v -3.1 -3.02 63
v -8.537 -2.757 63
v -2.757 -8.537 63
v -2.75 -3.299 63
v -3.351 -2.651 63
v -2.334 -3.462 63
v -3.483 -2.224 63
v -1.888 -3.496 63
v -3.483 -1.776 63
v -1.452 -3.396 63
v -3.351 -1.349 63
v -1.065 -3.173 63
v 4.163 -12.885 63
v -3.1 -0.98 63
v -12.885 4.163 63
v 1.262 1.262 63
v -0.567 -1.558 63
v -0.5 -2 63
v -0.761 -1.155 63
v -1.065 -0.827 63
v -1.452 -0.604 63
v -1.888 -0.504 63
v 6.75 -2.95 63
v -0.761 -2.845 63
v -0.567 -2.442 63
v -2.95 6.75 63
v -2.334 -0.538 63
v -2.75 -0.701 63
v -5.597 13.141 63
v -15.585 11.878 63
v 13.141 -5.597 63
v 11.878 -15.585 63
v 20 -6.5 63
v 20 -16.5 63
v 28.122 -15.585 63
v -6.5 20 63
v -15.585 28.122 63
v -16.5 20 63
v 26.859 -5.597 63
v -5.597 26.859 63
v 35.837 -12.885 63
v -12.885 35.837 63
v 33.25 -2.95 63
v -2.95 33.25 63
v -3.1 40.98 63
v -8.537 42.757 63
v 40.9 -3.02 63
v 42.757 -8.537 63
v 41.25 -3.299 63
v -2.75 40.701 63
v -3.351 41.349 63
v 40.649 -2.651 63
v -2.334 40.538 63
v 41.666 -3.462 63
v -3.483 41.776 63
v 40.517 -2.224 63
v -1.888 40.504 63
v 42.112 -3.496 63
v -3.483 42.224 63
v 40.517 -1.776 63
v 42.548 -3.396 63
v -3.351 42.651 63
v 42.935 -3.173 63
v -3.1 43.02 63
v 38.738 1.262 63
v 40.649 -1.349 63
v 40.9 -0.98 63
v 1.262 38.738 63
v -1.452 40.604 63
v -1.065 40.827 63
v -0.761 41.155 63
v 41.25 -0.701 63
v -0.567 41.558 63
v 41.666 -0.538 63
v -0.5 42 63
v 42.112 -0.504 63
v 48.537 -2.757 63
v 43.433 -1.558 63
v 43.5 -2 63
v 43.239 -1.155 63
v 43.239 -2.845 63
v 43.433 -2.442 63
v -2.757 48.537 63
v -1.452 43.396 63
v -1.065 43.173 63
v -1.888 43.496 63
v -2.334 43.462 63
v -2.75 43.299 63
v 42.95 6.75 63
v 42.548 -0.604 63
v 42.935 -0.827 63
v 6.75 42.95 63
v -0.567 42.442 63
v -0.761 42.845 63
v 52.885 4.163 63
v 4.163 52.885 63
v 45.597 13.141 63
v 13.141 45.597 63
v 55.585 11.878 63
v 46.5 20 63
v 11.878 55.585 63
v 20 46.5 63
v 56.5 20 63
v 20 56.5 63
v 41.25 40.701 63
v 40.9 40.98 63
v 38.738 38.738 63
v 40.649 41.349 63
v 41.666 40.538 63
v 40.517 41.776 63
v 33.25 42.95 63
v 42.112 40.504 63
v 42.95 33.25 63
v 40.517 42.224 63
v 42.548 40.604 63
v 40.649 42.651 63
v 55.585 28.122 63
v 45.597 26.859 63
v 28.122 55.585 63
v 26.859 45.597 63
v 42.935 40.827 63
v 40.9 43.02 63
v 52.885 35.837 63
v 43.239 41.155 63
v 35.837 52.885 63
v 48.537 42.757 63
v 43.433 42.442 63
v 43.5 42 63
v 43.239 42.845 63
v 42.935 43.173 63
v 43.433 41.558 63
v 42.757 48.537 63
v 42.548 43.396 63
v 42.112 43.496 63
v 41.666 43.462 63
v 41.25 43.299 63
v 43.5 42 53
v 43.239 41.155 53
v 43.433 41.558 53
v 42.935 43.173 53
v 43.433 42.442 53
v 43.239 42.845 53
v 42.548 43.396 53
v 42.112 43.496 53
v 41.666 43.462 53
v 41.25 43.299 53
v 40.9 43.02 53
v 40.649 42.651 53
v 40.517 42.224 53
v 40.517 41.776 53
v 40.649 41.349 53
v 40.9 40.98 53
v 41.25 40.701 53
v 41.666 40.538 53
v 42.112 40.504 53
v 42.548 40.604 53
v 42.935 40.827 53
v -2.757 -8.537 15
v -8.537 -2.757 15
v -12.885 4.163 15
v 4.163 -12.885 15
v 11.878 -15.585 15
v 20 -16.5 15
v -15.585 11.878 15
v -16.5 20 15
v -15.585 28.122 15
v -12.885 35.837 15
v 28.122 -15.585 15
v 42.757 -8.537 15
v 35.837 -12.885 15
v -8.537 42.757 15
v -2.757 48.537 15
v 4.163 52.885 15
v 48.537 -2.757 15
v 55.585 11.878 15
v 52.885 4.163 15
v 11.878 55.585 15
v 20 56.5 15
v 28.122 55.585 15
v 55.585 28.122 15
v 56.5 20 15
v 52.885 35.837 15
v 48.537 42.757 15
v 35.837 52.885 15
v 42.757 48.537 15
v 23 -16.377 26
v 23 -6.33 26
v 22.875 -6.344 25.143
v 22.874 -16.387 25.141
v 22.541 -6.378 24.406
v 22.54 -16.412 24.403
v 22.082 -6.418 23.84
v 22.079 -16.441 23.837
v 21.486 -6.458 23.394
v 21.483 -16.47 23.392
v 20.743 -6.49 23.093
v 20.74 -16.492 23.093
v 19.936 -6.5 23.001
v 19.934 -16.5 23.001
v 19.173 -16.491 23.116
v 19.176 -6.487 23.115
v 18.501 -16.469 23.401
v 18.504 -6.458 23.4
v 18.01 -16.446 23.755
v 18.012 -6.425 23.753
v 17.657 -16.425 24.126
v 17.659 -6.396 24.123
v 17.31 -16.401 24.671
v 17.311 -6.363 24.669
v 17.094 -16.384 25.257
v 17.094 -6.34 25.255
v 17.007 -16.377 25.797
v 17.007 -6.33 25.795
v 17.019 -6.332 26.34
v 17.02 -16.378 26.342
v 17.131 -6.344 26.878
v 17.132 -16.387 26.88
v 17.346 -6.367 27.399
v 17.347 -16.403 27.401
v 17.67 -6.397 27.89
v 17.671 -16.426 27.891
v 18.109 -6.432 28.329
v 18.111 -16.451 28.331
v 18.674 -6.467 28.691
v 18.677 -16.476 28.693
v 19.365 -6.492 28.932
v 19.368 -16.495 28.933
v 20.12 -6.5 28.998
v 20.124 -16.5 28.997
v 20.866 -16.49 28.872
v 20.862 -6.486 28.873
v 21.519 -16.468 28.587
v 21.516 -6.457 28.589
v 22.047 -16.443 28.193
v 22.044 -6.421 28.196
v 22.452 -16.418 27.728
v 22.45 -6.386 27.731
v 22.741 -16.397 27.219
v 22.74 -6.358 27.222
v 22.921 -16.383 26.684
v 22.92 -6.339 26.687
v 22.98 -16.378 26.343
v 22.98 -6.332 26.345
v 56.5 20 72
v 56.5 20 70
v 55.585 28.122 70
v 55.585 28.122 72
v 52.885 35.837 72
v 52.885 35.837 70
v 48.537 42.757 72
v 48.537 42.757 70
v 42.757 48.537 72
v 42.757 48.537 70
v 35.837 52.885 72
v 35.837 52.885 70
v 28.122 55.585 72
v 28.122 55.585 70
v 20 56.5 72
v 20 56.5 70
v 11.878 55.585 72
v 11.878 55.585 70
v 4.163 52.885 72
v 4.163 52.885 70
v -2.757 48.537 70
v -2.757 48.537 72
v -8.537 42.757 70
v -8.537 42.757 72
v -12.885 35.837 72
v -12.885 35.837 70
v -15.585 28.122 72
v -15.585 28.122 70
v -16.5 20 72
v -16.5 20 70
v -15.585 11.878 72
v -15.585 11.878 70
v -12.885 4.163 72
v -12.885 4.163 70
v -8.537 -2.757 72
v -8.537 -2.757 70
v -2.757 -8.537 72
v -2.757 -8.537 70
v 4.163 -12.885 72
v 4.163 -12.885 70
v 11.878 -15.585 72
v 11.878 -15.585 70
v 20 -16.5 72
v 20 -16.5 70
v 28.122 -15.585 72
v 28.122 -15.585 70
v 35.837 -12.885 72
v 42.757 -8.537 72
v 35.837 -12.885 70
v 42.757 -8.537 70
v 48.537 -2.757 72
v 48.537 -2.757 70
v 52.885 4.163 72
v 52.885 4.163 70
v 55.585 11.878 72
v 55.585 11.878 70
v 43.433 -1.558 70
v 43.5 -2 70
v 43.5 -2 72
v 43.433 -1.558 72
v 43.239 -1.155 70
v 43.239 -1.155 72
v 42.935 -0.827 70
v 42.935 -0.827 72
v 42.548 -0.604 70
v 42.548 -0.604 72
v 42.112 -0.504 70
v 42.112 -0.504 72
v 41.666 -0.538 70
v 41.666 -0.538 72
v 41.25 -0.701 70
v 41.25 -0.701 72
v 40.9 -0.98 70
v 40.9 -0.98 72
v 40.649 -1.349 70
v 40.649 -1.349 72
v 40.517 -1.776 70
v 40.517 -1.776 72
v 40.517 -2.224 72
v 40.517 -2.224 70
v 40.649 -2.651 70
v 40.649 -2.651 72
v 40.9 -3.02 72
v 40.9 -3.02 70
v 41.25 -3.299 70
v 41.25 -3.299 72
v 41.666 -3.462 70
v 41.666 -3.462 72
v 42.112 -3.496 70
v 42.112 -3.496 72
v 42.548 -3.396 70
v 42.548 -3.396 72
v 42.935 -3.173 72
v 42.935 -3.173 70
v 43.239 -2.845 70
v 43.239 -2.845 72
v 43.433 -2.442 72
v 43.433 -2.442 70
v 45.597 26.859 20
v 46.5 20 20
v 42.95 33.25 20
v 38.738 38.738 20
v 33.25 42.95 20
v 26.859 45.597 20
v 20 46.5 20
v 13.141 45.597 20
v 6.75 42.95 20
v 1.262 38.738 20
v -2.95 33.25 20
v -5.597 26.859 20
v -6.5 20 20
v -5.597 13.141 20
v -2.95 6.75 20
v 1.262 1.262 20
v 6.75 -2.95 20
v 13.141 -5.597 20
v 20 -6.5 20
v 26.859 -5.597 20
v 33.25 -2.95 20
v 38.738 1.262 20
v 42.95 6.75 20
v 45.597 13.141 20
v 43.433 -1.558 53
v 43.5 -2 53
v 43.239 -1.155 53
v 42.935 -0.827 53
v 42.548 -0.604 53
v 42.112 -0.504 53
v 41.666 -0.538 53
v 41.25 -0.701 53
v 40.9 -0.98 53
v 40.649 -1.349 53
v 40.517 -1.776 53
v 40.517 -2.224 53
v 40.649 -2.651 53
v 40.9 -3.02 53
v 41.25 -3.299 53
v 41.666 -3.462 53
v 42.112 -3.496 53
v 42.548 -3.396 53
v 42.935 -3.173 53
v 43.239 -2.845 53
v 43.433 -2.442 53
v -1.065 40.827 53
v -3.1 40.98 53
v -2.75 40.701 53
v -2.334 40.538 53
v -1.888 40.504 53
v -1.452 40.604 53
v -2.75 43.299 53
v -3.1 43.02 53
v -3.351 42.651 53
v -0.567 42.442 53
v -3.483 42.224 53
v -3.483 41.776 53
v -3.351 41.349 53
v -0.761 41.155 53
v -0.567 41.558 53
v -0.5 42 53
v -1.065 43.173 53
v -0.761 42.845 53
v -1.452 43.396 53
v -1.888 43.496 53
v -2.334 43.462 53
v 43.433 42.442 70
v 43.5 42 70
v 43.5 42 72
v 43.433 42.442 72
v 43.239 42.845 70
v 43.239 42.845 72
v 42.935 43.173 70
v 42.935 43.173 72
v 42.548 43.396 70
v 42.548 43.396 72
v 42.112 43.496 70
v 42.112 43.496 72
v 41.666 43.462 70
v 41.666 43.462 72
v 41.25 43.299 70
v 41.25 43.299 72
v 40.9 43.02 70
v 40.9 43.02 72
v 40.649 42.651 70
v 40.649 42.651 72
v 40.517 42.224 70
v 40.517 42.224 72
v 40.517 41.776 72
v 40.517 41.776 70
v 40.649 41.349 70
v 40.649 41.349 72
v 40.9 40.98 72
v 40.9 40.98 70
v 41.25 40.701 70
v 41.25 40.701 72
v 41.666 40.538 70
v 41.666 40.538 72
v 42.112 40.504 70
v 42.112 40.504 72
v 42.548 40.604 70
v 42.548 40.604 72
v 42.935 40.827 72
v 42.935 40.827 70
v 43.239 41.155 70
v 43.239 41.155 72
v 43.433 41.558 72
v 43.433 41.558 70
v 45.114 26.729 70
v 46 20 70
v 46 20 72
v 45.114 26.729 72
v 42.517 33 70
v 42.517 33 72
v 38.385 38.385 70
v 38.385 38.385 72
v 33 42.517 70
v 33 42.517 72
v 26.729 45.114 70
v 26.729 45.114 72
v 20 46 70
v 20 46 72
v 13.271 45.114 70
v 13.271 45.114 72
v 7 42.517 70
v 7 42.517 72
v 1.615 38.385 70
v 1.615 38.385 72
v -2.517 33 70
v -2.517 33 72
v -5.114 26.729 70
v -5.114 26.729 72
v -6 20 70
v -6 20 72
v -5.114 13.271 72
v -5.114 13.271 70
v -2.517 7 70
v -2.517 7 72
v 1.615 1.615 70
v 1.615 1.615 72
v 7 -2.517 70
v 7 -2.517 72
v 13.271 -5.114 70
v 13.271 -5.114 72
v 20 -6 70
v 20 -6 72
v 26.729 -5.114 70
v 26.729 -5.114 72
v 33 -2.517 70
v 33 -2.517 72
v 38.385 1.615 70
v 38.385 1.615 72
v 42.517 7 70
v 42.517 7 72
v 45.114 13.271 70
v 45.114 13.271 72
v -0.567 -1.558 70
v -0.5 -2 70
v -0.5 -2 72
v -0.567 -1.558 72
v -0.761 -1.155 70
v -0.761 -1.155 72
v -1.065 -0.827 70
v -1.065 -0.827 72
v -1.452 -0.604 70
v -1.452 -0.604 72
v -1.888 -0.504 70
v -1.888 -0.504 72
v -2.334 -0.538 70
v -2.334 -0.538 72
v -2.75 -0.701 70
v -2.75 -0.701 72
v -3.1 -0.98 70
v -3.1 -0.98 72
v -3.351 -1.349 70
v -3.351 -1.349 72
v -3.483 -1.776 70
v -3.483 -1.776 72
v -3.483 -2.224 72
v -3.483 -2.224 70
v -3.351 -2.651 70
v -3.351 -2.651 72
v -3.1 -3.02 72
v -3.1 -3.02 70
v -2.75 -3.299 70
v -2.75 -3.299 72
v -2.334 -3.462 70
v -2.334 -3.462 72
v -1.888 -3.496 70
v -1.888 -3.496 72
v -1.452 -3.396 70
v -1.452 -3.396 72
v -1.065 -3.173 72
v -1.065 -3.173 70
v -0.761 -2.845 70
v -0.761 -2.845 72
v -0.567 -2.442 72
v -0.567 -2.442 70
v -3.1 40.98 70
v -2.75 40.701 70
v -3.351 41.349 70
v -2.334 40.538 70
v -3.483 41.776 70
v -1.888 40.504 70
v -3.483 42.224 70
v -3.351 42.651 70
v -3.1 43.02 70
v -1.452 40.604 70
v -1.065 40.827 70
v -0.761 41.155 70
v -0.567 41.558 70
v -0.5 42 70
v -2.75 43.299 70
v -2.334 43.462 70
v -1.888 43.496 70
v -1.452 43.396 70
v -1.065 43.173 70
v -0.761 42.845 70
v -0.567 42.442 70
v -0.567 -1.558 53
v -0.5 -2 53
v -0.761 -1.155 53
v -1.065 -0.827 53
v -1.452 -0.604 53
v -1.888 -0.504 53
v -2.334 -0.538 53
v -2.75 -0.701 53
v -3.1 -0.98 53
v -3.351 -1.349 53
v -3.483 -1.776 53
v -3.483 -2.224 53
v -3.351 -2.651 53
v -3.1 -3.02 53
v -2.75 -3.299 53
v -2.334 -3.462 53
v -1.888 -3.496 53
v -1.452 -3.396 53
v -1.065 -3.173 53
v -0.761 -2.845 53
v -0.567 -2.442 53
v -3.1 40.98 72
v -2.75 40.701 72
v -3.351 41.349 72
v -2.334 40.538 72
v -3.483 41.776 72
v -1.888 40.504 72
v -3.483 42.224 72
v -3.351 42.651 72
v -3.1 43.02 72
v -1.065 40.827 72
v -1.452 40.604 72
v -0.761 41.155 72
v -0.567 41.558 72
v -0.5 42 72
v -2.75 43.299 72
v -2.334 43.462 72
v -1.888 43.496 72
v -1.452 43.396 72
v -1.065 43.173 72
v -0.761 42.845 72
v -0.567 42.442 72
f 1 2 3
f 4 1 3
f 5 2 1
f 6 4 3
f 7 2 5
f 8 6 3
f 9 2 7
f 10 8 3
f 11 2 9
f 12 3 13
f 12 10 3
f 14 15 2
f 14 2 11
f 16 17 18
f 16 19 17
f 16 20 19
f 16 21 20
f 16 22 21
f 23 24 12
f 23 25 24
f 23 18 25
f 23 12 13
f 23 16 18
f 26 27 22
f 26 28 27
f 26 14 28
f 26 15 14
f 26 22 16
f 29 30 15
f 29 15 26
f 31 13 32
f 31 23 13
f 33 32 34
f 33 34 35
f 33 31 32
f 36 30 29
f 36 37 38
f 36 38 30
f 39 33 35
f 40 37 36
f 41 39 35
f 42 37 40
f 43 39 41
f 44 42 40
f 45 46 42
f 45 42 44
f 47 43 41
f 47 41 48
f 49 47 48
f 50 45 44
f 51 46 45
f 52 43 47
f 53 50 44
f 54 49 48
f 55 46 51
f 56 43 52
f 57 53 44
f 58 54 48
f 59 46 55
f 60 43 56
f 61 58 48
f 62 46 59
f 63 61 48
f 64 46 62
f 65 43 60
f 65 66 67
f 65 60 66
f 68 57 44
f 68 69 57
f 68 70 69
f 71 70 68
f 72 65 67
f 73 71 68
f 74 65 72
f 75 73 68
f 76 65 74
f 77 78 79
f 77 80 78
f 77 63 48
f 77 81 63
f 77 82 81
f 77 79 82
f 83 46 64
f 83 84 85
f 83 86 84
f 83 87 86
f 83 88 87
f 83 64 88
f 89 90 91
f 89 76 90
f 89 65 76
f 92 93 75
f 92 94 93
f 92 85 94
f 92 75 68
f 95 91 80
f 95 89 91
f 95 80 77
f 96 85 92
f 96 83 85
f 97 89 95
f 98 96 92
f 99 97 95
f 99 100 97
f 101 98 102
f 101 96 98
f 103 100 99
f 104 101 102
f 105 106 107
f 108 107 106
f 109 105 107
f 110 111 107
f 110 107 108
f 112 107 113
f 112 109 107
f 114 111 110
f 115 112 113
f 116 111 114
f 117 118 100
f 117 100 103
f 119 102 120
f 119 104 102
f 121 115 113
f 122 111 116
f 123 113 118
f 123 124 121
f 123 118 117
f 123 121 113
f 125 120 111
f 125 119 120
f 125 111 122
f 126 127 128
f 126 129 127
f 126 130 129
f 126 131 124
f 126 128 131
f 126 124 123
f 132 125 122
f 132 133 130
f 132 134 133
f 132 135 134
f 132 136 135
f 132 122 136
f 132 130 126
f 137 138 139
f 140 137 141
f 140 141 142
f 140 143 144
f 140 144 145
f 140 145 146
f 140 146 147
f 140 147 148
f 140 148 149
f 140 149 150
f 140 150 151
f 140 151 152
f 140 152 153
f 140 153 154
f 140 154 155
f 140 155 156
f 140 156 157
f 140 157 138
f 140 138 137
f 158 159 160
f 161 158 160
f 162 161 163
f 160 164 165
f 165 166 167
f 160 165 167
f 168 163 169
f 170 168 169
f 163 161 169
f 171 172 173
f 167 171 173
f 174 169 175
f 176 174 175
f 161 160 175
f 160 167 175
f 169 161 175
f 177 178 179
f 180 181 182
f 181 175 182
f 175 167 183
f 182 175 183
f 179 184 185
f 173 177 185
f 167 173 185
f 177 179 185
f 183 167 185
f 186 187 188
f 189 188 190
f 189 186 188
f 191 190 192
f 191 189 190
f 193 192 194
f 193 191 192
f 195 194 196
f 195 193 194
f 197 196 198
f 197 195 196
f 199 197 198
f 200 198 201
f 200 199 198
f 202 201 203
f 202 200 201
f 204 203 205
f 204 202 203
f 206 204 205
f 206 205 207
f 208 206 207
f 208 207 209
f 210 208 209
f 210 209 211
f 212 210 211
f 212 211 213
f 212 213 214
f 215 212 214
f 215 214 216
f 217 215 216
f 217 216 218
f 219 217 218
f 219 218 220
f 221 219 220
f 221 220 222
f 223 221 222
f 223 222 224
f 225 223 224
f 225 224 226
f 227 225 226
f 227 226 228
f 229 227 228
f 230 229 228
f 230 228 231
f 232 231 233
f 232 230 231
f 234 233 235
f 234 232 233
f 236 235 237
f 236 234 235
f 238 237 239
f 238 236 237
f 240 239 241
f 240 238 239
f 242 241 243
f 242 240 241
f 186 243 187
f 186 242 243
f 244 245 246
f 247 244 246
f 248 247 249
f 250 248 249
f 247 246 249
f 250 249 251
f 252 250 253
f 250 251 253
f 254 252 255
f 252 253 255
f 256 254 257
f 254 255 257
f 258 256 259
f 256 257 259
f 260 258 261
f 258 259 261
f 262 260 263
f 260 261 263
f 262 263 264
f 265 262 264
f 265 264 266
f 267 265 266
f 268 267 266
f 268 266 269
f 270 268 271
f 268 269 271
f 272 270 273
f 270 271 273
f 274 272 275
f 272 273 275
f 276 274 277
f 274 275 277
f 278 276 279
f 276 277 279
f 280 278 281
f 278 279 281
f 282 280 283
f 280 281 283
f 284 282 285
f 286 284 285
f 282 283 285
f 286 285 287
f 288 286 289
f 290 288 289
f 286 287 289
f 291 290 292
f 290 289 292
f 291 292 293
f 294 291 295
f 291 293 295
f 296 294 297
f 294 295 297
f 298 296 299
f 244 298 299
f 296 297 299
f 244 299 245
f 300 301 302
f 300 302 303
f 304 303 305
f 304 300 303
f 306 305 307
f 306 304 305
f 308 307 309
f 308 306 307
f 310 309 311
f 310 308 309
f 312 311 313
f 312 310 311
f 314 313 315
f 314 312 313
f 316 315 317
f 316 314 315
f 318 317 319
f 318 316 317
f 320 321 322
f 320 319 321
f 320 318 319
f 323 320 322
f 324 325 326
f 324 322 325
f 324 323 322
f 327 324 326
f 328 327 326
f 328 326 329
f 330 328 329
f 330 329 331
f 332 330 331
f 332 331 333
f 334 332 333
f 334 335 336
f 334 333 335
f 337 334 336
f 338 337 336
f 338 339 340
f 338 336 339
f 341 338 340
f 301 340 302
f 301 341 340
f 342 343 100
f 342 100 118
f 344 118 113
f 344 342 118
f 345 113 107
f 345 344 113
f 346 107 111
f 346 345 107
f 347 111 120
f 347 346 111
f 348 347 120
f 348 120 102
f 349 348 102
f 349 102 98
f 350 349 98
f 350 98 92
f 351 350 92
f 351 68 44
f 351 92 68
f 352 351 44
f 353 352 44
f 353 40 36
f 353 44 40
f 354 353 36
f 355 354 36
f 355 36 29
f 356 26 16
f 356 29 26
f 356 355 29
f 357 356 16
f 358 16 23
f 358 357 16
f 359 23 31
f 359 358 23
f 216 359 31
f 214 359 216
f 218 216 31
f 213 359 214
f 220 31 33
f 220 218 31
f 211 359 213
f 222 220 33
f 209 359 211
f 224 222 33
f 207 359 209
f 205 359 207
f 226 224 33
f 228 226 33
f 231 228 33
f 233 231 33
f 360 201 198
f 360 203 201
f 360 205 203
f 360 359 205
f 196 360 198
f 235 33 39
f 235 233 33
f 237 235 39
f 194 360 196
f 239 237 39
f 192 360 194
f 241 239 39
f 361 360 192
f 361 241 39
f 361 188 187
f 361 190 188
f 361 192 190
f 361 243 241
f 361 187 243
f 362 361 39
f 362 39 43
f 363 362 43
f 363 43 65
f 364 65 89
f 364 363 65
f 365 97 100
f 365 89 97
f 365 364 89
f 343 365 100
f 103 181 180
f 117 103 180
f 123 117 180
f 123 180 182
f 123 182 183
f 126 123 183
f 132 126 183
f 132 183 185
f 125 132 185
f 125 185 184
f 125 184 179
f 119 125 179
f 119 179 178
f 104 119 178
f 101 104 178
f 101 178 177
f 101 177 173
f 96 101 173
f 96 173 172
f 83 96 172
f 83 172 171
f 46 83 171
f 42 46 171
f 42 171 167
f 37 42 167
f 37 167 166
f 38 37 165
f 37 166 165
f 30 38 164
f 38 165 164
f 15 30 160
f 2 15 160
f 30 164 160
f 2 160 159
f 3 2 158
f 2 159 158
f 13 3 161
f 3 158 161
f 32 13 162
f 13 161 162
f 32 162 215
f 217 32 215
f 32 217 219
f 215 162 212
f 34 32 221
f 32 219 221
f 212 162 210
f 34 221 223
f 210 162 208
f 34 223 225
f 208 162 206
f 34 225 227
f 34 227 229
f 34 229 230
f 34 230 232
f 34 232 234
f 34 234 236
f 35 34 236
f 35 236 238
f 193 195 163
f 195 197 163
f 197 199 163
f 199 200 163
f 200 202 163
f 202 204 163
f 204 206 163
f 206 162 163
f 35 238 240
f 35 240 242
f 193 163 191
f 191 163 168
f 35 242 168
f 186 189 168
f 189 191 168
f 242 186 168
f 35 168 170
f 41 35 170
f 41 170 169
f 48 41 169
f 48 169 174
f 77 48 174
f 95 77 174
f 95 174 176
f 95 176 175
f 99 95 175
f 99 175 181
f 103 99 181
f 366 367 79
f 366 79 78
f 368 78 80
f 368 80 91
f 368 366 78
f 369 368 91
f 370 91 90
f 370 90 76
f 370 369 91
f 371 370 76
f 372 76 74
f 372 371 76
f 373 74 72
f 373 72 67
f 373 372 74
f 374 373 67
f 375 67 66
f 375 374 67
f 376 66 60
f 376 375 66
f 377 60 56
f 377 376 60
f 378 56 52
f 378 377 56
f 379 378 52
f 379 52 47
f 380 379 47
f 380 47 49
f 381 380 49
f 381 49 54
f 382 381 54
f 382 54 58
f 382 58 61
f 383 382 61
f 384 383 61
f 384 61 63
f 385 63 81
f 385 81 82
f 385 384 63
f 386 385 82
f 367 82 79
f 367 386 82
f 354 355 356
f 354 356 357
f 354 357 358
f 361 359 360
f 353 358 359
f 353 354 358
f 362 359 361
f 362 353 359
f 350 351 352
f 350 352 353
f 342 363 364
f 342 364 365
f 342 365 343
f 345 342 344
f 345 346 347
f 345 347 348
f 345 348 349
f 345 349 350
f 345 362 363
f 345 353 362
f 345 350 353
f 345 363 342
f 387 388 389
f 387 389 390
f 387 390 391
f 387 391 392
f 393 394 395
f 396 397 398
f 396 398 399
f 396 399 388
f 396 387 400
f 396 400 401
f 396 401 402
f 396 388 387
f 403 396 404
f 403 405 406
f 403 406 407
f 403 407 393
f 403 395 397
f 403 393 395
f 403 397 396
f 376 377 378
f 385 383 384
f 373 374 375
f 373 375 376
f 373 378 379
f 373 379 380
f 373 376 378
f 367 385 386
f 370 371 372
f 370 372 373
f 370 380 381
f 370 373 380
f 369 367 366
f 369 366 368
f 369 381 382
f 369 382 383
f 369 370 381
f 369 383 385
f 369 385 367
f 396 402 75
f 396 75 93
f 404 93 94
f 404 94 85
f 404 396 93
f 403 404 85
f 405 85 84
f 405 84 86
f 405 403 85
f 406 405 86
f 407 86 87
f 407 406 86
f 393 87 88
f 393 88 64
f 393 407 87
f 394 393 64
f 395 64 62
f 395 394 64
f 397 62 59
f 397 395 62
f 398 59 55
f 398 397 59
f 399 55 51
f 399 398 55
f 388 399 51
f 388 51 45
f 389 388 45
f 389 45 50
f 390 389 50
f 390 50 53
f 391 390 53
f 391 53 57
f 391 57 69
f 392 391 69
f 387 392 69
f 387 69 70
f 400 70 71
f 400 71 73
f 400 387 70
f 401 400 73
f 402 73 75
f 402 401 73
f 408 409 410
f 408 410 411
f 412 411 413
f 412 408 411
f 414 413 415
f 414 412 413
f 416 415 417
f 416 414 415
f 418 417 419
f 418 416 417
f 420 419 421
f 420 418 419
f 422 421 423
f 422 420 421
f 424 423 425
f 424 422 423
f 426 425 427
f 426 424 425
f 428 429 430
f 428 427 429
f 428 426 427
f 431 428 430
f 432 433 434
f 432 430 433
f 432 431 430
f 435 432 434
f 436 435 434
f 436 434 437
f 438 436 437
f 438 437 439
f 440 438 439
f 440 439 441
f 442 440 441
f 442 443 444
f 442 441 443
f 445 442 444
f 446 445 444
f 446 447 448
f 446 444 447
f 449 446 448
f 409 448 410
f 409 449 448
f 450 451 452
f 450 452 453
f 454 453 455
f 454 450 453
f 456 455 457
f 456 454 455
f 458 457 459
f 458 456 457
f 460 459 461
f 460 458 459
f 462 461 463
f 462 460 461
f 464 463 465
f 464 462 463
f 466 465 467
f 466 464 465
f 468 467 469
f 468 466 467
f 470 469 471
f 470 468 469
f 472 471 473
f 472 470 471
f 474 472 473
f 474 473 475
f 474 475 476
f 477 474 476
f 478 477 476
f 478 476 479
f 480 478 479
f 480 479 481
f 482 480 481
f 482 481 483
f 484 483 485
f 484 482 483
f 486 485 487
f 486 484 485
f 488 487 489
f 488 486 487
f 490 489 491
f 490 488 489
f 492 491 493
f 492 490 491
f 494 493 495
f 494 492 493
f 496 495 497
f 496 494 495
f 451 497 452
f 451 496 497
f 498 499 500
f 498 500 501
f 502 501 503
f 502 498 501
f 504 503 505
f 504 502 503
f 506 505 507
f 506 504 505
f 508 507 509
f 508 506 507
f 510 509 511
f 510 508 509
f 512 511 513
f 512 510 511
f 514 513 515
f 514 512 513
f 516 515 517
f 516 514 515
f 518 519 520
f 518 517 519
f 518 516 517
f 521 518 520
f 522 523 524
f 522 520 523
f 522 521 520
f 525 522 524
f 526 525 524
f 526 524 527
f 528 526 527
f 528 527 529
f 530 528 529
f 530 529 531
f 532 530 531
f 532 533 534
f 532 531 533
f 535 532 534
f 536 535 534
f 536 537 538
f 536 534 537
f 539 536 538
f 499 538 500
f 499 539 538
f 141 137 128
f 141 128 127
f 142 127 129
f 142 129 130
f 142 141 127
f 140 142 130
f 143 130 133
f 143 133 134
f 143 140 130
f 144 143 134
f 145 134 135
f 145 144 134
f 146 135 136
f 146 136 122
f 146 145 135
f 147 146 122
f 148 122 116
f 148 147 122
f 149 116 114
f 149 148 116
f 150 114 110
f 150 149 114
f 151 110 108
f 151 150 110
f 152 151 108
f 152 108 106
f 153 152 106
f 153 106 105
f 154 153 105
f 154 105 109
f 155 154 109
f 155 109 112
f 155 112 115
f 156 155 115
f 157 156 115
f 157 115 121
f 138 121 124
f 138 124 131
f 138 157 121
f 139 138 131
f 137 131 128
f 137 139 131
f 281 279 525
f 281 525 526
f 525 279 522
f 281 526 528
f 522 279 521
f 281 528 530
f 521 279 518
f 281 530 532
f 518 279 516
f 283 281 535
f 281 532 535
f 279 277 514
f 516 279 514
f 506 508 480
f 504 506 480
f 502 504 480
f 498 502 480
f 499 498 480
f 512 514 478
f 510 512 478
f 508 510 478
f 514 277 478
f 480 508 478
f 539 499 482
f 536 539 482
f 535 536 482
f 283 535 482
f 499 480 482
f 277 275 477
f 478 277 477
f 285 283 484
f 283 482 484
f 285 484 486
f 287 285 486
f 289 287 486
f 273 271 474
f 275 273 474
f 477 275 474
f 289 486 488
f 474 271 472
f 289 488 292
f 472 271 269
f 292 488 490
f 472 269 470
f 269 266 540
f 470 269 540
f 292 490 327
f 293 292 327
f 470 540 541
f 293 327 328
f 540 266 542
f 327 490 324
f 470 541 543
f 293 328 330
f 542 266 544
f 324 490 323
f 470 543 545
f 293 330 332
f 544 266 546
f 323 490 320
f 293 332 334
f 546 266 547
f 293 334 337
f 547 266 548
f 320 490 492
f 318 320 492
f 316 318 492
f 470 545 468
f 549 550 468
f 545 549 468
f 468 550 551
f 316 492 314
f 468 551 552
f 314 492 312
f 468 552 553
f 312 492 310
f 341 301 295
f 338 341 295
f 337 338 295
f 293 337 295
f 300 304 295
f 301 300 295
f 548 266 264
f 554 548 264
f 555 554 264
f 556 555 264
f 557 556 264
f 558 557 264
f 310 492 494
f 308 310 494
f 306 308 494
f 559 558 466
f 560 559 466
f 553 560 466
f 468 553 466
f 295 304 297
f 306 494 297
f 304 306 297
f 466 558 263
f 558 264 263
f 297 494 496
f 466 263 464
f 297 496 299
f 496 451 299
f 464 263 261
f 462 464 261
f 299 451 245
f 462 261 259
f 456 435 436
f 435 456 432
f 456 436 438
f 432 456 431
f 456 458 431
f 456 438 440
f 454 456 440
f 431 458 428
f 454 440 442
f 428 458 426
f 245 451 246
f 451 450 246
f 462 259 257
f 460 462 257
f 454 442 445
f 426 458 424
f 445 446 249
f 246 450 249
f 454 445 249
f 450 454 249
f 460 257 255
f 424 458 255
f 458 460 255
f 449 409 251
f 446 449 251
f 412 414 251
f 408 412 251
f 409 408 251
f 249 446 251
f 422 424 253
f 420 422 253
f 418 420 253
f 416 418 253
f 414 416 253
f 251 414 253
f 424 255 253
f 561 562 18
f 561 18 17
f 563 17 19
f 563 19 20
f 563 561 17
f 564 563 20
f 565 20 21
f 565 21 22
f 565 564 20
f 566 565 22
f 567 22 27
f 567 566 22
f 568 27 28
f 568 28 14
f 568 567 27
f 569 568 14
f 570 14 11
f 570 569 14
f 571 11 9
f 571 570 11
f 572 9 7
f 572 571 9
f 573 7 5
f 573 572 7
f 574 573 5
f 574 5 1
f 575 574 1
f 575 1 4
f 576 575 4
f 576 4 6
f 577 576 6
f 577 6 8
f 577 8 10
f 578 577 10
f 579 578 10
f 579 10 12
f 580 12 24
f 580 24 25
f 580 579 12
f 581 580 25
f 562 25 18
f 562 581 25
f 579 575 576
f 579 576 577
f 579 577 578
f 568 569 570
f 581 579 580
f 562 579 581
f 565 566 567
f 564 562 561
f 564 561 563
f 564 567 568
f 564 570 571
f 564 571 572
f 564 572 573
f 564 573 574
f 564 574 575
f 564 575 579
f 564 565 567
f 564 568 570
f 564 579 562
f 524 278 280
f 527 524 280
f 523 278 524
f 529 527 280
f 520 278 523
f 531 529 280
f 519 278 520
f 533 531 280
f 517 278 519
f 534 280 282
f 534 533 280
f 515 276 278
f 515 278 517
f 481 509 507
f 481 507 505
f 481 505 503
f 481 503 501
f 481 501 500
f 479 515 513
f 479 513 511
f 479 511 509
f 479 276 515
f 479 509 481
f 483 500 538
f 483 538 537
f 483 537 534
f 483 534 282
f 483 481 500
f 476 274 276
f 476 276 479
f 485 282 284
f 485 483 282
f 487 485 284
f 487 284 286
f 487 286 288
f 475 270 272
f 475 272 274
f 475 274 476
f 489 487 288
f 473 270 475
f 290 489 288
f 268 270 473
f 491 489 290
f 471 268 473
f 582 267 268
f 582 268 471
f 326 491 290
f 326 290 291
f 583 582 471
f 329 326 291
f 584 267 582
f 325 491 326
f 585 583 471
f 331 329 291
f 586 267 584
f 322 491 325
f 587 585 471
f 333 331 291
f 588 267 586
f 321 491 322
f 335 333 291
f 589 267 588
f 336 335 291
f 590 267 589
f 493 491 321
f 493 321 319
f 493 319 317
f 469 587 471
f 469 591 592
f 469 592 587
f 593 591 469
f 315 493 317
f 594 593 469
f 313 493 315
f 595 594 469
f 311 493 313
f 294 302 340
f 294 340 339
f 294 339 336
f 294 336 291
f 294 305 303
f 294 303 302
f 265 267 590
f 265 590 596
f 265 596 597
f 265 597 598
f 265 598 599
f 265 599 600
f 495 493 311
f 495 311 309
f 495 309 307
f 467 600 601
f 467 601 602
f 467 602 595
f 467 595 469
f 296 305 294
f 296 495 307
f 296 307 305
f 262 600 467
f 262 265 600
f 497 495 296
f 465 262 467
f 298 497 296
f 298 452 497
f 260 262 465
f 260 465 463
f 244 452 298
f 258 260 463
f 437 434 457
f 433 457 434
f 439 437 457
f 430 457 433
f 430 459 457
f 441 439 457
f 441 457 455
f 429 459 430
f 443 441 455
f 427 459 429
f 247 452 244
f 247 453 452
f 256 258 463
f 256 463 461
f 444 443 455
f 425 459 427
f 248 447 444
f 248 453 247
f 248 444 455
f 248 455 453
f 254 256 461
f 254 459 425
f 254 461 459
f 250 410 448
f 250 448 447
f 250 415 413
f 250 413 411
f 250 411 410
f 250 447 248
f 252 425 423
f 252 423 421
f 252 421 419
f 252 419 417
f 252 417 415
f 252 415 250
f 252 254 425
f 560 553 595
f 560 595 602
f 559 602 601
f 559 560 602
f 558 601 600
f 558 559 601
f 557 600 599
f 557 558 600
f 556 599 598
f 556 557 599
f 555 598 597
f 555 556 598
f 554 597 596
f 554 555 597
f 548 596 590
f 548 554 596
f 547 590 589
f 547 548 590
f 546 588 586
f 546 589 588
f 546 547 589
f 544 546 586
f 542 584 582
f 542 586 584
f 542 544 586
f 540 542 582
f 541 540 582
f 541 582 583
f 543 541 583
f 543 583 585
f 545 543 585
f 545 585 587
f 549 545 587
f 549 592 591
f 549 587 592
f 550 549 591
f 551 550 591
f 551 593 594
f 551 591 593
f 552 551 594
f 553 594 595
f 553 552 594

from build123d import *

# Parameters (mm, degrees)
CYLINDER010_R          = 1.5
CYLINDER010_DEPTH      = 10
CYLINDER008_R          = 1.5
CYLINDER008_DEPTH      = 10
CYLINDER009_R          = 1.5
CYLINDER009_DEPTH      = 10
CYLINDER011_R          = 1.5
CYLINDER011_DEPTH      = 10
CYLINDER007_R          = 26
CYLINDER007_DEPTH      = 2
CYLINDER006_R          = 36.5
CYLINDER006_DEPTH      = 2
CYLINDER012_R          = 3
CYLINDER012_DEPTH      = 20
CYLINDER012_ROLL_ANGLE = -90
CYLINDER004_R          = 1.5
CYLINDER004_DEPTH      = 10
CYLINDER002_R          = 1.5
CYLINDER002_DEPTH      = 10
CYLINDER003_R          = 1.5
CYLINDER003_DEPTH      = 10
CYLINDER005_R          = 1.5
CYLINDER005_DEPTH      = 10
CYLINDER_R             = 26.5
CYLINDER_DEPTH         = 45
CYLINDER001_R          = 36.5
CYLINDER001_DEPTH      = 48


with BuildPart() as cylinder010:
    # Cylinder010 → Cylinder010 (new body)
    with BuildSketch(Plane(origin=(-2, -2, 63), x_dir=(1, 0, 0), z_dir=(0, 0, 1))):
        Circle(CYLINDER010_R)
    extrude(amount=CYLINDER010_DEPTH)


with BuildPart() as cylinder008:
    # Cylinder008 → Cylinder008 (new body)
    with BuildSketch(Plane(origin=(42, 42, 63), x_dir=(1, 0, 0), z_dir=(0, 0, 1))):
        Circle(CYLINDER008_R)
    extrude(amount=CYLINDER008_DEPTH)


with BuildPart() as cylinder009:
    # Cylinder009 → Cylinder009 (new body)
    with BuildSketch(Plane(origin=(-2, 42, 63), x_dir=(1, 0, 0), z_dir=(0, 0, 1))):
        Circle(CYLINDER009_R)
    extrude(amount=CYLINDER009_DEPTH)


with BuildPart() as fusion001:
    # Cylinder011 → Cylinder011 (new body)
    with BuildSketch(Plane(origin=(42, -2, 63), x_dir=(1, 0, 0), z_dir=(0, 0, 1))):
        Circle(CYLINDER011_R)
    extrude(amount=CYLINDER011_DEPTH)

    # Fusion001: union Cylinder010, Cylinder008, Cylinder009
    add(cylinder010.part)
    add(cylinder008.part)
    add(cylinder009.part)


with BuildPart() as cylinder007:
    # Cylinder007 → Cylinder007 (new body)
    with BuildSketch(Plane(origin=(20, 20, 20), x_dir=(1, 0, 0), z_dir=(0, 0, 1))):
        Circle(CYLINDER007_R)
    extrude(amount=CYLINDER007_DEPTH)


with BuildPart() as cut003:
    # Cylinder006 → Cylinder006 (new body)
    with BuildSketch(Plane(origin=(20, 20, 20), x_dir=(1, 0, 0), z_dir=(0, 0, 1))):
        Circle(CYLINDER006_R)
    extrude(amount=CYLINDER006_DEPTH)

    # Cut002: cut Cylinder007
    add(cylinder007.part, mode=Mode.SUBTRACT)


with BuildPart() as cut003_1:
    # Cut002 placement: moved
    add(cut003.part.moved(Location((0, 0, 50))))

    # Cut003: cut Fusion001
    add(fusion001.part, mode=Mode.SUBTRACT)


with BuildPart() as cylinder012:
    # Cylinder012 → Cylinder012 (new body)
    with BuildSketch(Plane.XY):
        Circle(CYLINDER012_R)
    extrude(amount=CYLINDER012_DEPTH)


with BuildPart() as cylinder012_1:
    # Cylinder012 roll: moved
    add(cylinder012.part.rotate(Axis((0, 0, 0), (1, 0, 0)), CYLINDER012_ROLL_ANGLE))


with BuildPart() as cylinder012_2:
    # Cylinder012 placement: moved
    add(cylinder012_1.part.moved(Location((20, -20, 26))))


with BuildPart() as cylinder004:
    # Cylinder004 → Cylinder004 (new body)
    with BuildSketch(Plane(origin=(-2, -2, 63), x_dir=(1, 0, 0), z_dir=(0, 0, 1))):
        Circle(CYLINDER004_R)
    extrude(amount=CYLINDER004_DEPTH)


with BuildPart() as cylinder002:
    # Cylinder002 → Cylinder002 (new body)
    with BuildSketch(Plane(origin=(42, 42, 63), x_dir=(1, 0, 0), z_dir=(0, 0, 1))):
        Circle(CYLINDER002_R)
    extrude(amount=CYLINDER002_DEPTH)


with BuildPart() as cylinder003:
    # Cylinder003 → Cylinder003 (new body)
    with BuildSketch(Plane(origin=(-2, 42, 63), x_dir=(1, 0, 0), z_dir=(0, 0, 1))):
        Circle(CYLINDER003_R)
    extrude(amount=CYLINDER003_DEPTH)


with BuildPart() as fusion:
    # Cylinder005 → Cylinder005 (new body)
    with BuildSketch(Plane(origin=(42, -2, 63), x_dir=(1, 0, 0), z_dir=(0, 0, 1))):
        Circle(CYLINDER005_R)
    extrude(amount=CYLINDER005_DEPTH)

    # Fusion: union Cylinder004, Cylinder002, Cylinder003
    add(cylinder004.part)
    add(cylinder002.part)
    add(cylinder003.part)


with BuildPart() as fusion_1:
    # Fusion placement: moved
    add(fusion.part.moved(Location((0, 0, -10))))


with BuildPart() as cylinder:
    # Cylinder → Cylinder (new body)
    with BuildSketch(Plane(origin=(20, 20, 20), x_dir=(1, 0, 0), z_dir=(0, 0, 1))):
        Circle(CYLINDER_R)
    extrude(amount=CYLINDER_DEPTH)


with BuildPart() as cut004:
    # Cylinder001 → Cylinder001 (new body)
    with BuildSketch(Plane(origin=(20, 20, 15), x_dir=(1, 0, 0), z_dir=(0, 0, 1))):
        Circle(CYLINDER001_R)
    extrude(amount=CYLINDER001_DEPTH)

    # Cut: cut Cylinder
    add(cylinder.part, mode=Mode.SUBTRACT)

    # Cut001: cut Fusion
    add(fusion_1.part, mode=Mode.SUBTRACT)

    # Cut004: cut Cylinder012
    add(cylinder012_2.part, mode=Mode.SUBTRACT)


solid = Compound([cut003_1.part, cut004.part])
